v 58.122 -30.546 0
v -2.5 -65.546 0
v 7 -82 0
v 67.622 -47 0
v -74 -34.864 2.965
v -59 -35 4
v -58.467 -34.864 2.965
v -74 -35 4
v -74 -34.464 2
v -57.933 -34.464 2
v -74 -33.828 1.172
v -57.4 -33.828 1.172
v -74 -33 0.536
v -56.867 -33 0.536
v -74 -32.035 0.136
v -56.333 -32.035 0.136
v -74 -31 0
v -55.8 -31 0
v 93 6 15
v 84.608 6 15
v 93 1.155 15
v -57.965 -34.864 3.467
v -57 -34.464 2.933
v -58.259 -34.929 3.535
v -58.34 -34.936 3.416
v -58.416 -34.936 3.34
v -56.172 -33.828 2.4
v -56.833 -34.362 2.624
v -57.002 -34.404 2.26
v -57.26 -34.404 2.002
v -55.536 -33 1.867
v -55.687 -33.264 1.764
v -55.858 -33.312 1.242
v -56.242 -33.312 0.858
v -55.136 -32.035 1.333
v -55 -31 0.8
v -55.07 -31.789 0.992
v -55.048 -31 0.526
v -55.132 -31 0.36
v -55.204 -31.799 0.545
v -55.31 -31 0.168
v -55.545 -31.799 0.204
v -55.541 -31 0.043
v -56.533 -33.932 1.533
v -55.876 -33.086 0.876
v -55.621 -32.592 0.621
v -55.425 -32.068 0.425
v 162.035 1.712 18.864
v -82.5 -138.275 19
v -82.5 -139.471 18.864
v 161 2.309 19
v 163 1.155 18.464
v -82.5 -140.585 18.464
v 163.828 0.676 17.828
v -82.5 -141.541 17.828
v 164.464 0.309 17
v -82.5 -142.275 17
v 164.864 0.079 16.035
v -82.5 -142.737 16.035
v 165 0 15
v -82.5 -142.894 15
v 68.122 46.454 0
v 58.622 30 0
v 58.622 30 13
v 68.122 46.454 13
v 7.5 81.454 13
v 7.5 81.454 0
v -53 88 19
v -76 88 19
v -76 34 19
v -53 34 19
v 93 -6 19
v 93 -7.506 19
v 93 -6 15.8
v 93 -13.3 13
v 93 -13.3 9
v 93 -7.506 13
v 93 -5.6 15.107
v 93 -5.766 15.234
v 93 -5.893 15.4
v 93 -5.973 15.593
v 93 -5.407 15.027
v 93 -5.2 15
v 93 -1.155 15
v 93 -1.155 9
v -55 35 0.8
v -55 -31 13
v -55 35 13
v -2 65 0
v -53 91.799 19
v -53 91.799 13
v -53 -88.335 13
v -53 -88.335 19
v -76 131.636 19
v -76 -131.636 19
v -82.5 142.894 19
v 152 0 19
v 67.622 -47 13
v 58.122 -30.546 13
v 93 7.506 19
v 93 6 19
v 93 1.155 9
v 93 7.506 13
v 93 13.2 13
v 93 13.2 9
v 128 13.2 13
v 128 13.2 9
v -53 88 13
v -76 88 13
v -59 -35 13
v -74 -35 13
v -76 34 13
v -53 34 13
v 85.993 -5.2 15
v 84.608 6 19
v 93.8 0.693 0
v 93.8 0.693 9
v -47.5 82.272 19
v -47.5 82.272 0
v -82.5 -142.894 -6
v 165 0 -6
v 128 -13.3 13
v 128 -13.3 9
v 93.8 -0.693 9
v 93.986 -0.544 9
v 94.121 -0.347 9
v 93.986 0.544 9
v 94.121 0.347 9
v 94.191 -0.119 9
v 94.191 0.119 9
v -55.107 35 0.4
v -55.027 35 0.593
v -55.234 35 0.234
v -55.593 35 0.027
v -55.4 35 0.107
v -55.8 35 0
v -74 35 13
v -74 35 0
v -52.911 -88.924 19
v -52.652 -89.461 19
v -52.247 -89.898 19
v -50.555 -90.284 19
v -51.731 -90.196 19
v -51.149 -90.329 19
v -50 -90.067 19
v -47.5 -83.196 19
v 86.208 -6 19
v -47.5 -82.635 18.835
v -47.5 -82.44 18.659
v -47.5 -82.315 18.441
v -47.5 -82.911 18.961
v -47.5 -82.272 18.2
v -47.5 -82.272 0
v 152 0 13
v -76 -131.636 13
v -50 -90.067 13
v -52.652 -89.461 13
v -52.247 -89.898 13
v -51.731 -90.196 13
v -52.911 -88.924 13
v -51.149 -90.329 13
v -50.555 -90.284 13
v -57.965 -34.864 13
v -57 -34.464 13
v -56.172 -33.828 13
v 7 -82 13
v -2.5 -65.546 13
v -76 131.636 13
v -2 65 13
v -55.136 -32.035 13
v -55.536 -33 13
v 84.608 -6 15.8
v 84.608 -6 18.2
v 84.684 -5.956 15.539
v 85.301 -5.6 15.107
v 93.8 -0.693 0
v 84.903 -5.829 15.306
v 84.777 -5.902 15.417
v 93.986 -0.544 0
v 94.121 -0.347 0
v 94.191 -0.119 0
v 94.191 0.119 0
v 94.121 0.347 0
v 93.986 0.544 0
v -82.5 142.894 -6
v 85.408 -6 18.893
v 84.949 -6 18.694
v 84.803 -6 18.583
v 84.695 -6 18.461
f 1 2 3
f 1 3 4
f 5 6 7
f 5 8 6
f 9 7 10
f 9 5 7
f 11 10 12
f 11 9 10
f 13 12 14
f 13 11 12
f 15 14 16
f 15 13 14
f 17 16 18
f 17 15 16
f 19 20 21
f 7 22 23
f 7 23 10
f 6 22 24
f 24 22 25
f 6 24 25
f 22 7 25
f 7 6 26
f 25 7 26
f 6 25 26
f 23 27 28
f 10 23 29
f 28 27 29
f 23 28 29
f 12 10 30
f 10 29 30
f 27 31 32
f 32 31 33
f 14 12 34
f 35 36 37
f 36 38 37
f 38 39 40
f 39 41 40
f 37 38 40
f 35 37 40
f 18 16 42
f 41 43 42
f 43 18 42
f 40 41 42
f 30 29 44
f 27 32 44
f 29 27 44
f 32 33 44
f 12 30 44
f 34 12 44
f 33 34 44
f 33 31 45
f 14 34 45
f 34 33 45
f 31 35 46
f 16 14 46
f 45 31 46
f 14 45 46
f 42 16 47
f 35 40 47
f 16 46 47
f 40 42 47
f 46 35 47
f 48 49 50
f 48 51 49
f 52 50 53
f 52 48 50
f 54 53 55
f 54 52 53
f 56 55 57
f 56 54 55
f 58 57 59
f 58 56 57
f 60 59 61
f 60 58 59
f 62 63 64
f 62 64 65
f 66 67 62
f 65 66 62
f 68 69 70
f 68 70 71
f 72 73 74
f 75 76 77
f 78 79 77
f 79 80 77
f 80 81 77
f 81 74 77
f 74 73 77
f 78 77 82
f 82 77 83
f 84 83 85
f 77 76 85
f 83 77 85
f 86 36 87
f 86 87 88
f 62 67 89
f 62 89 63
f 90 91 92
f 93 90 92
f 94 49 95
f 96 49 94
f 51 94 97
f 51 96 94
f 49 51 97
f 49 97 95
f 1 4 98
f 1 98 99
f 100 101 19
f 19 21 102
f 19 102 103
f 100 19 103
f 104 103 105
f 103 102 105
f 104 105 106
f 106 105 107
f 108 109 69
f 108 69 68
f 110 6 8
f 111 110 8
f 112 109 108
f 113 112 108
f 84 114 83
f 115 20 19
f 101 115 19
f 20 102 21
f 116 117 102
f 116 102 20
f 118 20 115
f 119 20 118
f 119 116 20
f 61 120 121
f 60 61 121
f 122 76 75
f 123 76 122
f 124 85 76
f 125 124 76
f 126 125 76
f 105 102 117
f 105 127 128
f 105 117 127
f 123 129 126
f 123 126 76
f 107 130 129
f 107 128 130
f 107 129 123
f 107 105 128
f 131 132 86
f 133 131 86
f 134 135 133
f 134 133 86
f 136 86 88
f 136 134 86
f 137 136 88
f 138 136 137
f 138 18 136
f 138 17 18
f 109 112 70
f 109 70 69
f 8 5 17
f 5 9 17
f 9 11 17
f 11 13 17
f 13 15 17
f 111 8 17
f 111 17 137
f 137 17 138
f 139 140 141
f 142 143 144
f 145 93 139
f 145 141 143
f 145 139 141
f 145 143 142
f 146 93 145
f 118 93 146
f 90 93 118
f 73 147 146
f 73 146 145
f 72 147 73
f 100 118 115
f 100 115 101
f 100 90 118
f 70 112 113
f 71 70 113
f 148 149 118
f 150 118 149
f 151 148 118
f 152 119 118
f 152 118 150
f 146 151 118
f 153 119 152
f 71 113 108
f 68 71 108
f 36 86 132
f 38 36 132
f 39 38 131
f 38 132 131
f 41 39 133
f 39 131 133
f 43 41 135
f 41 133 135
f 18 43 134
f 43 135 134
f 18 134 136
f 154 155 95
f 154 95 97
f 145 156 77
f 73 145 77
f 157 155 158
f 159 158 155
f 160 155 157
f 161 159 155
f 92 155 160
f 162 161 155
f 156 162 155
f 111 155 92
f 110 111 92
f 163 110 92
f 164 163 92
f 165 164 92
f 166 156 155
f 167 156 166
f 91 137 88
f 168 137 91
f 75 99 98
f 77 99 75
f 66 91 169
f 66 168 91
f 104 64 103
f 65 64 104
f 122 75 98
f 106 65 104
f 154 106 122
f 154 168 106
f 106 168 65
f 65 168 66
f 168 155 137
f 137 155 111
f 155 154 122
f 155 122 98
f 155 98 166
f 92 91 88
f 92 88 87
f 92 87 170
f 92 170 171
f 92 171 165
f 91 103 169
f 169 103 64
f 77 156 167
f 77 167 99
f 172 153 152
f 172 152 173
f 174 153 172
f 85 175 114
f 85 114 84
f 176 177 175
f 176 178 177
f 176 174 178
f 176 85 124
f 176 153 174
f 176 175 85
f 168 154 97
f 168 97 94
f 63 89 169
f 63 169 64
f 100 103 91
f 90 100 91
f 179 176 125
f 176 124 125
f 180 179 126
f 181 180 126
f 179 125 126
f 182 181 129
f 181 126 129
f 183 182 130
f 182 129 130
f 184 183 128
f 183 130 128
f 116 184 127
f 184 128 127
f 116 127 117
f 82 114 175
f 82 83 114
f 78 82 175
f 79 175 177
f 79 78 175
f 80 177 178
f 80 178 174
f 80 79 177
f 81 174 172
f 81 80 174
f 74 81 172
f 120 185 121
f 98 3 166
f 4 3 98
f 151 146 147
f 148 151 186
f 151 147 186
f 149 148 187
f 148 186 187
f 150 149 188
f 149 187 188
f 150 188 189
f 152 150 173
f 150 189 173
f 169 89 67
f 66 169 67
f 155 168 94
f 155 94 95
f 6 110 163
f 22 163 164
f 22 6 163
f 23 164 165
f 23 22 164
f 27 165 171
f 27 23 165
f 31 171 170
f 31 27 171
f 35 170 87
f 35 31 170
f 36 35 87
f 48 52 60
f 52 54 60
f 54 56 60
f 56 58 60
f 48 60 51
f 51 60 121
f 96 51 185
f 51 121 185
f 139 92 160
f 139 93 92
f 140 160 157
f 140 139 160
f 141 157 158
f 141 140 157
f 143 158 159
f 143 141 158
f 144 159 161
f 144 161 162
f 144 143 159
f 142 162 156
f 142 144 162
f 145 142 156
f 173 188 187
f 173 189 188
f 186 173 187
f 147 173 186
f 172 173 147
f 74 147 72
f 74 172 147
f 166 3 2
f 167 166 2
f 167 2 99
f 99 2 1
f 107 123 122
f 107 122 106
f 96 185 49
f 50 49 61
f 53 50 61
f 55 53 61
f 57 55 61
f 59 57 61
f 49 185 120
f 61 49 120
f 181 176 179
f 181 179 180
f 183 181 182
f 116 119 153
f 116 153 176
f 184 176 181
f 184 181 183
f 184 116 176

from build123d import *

# Parameters (mm, degrees)
BOX005_W               = 23
BOX005_H               = 54
BOX005_DEPTH           = 6
PRISM003_DEPTH         = 6
PRISM002_DEPTH         = 6
BOX004_W               = 10
BOX004_H               = 12
BOX004_DEPTH           = 4
BOX003_W               = 35
BOX003_H               = 26.5
BOX003_DEPTH           = 10
BOX002_W               = 70
BOX002_H               = 19
BOX002_DEPTH           = 19
BOX002_PLACEMENT_ANGLE = 30
BOX001_W               = 70
BOX001_H               = 19
BOX001_DEPTH           = 19
BOX001_PLACEMENT_ANGLE = 90
BOX_W                  = 70
BOX_H                  = 19
BOX_DEPTH              = 19
BOX_PLACEMENT_ANGLE    = 30
PRISM001_DEPTH         = 19
PRISM_DEPTH            = 25
FILLET_R               = 0.8
FILLET001_R            = 4
FILLET002_R            = 2


with BuildPart() as box005:
    # Box005 → Box005 (new body)
    with BuildSketch(Plane(origin=(-76, 34, 13), x_dir=(1, 0, 0), z_dir=(0, 0, 1))):
        with Locations((11.5, 27)):
            Rectangle(BOX005_W, BOX005_H)
    extrude(amount=BOX005_DEPTH)


with BuildPart() as prism003:
    # Prism003 → Prism003 (new body)
    with BuildSketch(Plane.XY.offset(13)):
        Polygon((106, 0), (-53, 91.798693), (-53, -91.798693), align=None)
    extrude(amount=PRISM003_DEPTH)


with BuildPart() as cut006:
    # Prism002 → Prism002 (new body)
    with BuildSketch(Plane.XY.offset(13)):
        Polygon((152, 0), (-76, 131.635861), (-76, -131.635861), align=None)
    extrude(amount=PRISM002_DEPTH)

    # Cut006: cut Prism003
    add(prism003.part, mode=Mode.SUBTRACT)


with BuildPart() as box004:
    # Box004 → Box004 (new body)
    with BuildSketch(Plane(origin=(84, -6, 15), x_dir=(1, 0, 0), z_dir=(0, 0, 1))):
        with Locations((5, 6)):
            Rectangle(BOX004_W, BOX004_H)
    extrude(amount=BOX004_DEPTH)


with BuildPart() as box003:
    # Box003 → Box003 (new body)
    with BuildSketch(Plane(origin=(93, -13.3, 9), x_dir=(1, 0, 0), z_dir=(0, 0, 1))):
        with Locations((17.5, 13.25)):
            Rectangle(BOX003_W, BOX003_H)
    extrude(amount=BOX003_DEPTH)


with BuildPart() as box002:
    # Box002 → Box002 (new body)
    with BuildSketch(Plane.XY):
        with Locations((35, 9.5)):
            Rectangle(BOX002_W, BOX002_H)
    extrude(amount=BOX002_DEPTH)


with BuildPart() as box002_1:
    # Box002 placement: moved
    add(box002.part.moved(Location((7, -82, 0))).rotate(Axis((7, -82, 0), (0, 0, 1)), BOX002_PLACEMENT_ANGLE))


with BuildPart() as box001:
    # Box001 → Box001 (new body)
    with BuildSketch(Plane.XY):
        with Locations((35, 9.5)):
            Rectangle(BOX001_W, BOX001_H)
    extrude(amount=BOX001_DEPTH)


with BuildPart() as box001_1:
    # Box001 placement: moved
    add(box001.part.moved(Location((-55, -35, 0))).rotate(Axis((-55, -35, 0), (0, 0, 1)), BOX001_PLACEMENT_ANGLE))


with BuildPart() as box:
    # Box → Box (new body)
    with BuildSketch(Plane.XY):
        with Locations((35, 9.5)):
            Rectangle(BOX_W, BOX_H)
    extrude(amount=BOX_DEPTH)


with BuildPart() as box_1:
    # Box placement: moved
    add(box.part.moved(Location((-2, 65, 0))).rotate(Axis((-2, 65, 0), (0, 0, -1)), BOX_PLACEMENT_ANGLE))


with BuildPart() as prism001:
    # Prism001 → Prism001 (new body)
    with BuildSketch(Plane.XY):
        Polygon((95, 0), (-47.5, 82.272413), (-47.5, -82.272413), align=None)
    extrude(amount=PRISM001_DEPTH)


with BuildPart() as fillet002:
    # Prism → Prism (new body)
    with BuildSketch(Plane.XY.offset(-6)):
        Polygon((165, 0), (-82.5, 142.894192), (-82.5, -142.894192), align=None)
    extrude(amount=PRISM_DEPTH)

    # Cut: cut Prism001
    add(prism001.part, mode=Mode.SUBTRACT)

    # Cut001: cut Box
    add(box_1.part, mode=Mode.SUBTRACT)

    # Cut002: cut Box001
    add(box001_1.part, mode=Mode.SUBTRACT)

    # Cut003: cut Box002
    add(box002_1.part, mode=Mode.SUBTRACT)

    # Cut004: cut Box003
    add(box003.part, mode=Mode.SUBTRACT)

    # Cut005: cut Box004
    add(box004.part, mode=Mode.SUBTRACT)

    # Cut007: cut Cut006
    add(cut006.part, mode=Mode.SUBTRACT)

    # Fillet
    fillet_edges = [fillet002.edges().sort_by_distance(p)[0] for p in [
        (-55, 0, 0),
        (18.553848, -44.136207, 19),
        (95, 0, 4.5),
        (88.803848, -6, 15),
    ]]
    fillet(fillet_edges, radius=FILLET_R)

    # Fillet001
    fillet001_edges = [fillet002.edges().sort_by_distance(p)[0] for p in [
        (-64.9, -35, 0),
        (41.25, -71.447096, 19),
    ]]
    fillet(fillet001_edges, radius=FILLET001_R)

    # Fillet002
    fillet002_edges = [fillet002.edges().sort_by_distance(p)[0] for p in [
        (-66.5, -35, 4),
        (-53, -91.798693, 16),
    ]]
    fillet(fillet002_edges, radius=FILLET002_R)


solid = Compound([box005.part, fillet002.part])
